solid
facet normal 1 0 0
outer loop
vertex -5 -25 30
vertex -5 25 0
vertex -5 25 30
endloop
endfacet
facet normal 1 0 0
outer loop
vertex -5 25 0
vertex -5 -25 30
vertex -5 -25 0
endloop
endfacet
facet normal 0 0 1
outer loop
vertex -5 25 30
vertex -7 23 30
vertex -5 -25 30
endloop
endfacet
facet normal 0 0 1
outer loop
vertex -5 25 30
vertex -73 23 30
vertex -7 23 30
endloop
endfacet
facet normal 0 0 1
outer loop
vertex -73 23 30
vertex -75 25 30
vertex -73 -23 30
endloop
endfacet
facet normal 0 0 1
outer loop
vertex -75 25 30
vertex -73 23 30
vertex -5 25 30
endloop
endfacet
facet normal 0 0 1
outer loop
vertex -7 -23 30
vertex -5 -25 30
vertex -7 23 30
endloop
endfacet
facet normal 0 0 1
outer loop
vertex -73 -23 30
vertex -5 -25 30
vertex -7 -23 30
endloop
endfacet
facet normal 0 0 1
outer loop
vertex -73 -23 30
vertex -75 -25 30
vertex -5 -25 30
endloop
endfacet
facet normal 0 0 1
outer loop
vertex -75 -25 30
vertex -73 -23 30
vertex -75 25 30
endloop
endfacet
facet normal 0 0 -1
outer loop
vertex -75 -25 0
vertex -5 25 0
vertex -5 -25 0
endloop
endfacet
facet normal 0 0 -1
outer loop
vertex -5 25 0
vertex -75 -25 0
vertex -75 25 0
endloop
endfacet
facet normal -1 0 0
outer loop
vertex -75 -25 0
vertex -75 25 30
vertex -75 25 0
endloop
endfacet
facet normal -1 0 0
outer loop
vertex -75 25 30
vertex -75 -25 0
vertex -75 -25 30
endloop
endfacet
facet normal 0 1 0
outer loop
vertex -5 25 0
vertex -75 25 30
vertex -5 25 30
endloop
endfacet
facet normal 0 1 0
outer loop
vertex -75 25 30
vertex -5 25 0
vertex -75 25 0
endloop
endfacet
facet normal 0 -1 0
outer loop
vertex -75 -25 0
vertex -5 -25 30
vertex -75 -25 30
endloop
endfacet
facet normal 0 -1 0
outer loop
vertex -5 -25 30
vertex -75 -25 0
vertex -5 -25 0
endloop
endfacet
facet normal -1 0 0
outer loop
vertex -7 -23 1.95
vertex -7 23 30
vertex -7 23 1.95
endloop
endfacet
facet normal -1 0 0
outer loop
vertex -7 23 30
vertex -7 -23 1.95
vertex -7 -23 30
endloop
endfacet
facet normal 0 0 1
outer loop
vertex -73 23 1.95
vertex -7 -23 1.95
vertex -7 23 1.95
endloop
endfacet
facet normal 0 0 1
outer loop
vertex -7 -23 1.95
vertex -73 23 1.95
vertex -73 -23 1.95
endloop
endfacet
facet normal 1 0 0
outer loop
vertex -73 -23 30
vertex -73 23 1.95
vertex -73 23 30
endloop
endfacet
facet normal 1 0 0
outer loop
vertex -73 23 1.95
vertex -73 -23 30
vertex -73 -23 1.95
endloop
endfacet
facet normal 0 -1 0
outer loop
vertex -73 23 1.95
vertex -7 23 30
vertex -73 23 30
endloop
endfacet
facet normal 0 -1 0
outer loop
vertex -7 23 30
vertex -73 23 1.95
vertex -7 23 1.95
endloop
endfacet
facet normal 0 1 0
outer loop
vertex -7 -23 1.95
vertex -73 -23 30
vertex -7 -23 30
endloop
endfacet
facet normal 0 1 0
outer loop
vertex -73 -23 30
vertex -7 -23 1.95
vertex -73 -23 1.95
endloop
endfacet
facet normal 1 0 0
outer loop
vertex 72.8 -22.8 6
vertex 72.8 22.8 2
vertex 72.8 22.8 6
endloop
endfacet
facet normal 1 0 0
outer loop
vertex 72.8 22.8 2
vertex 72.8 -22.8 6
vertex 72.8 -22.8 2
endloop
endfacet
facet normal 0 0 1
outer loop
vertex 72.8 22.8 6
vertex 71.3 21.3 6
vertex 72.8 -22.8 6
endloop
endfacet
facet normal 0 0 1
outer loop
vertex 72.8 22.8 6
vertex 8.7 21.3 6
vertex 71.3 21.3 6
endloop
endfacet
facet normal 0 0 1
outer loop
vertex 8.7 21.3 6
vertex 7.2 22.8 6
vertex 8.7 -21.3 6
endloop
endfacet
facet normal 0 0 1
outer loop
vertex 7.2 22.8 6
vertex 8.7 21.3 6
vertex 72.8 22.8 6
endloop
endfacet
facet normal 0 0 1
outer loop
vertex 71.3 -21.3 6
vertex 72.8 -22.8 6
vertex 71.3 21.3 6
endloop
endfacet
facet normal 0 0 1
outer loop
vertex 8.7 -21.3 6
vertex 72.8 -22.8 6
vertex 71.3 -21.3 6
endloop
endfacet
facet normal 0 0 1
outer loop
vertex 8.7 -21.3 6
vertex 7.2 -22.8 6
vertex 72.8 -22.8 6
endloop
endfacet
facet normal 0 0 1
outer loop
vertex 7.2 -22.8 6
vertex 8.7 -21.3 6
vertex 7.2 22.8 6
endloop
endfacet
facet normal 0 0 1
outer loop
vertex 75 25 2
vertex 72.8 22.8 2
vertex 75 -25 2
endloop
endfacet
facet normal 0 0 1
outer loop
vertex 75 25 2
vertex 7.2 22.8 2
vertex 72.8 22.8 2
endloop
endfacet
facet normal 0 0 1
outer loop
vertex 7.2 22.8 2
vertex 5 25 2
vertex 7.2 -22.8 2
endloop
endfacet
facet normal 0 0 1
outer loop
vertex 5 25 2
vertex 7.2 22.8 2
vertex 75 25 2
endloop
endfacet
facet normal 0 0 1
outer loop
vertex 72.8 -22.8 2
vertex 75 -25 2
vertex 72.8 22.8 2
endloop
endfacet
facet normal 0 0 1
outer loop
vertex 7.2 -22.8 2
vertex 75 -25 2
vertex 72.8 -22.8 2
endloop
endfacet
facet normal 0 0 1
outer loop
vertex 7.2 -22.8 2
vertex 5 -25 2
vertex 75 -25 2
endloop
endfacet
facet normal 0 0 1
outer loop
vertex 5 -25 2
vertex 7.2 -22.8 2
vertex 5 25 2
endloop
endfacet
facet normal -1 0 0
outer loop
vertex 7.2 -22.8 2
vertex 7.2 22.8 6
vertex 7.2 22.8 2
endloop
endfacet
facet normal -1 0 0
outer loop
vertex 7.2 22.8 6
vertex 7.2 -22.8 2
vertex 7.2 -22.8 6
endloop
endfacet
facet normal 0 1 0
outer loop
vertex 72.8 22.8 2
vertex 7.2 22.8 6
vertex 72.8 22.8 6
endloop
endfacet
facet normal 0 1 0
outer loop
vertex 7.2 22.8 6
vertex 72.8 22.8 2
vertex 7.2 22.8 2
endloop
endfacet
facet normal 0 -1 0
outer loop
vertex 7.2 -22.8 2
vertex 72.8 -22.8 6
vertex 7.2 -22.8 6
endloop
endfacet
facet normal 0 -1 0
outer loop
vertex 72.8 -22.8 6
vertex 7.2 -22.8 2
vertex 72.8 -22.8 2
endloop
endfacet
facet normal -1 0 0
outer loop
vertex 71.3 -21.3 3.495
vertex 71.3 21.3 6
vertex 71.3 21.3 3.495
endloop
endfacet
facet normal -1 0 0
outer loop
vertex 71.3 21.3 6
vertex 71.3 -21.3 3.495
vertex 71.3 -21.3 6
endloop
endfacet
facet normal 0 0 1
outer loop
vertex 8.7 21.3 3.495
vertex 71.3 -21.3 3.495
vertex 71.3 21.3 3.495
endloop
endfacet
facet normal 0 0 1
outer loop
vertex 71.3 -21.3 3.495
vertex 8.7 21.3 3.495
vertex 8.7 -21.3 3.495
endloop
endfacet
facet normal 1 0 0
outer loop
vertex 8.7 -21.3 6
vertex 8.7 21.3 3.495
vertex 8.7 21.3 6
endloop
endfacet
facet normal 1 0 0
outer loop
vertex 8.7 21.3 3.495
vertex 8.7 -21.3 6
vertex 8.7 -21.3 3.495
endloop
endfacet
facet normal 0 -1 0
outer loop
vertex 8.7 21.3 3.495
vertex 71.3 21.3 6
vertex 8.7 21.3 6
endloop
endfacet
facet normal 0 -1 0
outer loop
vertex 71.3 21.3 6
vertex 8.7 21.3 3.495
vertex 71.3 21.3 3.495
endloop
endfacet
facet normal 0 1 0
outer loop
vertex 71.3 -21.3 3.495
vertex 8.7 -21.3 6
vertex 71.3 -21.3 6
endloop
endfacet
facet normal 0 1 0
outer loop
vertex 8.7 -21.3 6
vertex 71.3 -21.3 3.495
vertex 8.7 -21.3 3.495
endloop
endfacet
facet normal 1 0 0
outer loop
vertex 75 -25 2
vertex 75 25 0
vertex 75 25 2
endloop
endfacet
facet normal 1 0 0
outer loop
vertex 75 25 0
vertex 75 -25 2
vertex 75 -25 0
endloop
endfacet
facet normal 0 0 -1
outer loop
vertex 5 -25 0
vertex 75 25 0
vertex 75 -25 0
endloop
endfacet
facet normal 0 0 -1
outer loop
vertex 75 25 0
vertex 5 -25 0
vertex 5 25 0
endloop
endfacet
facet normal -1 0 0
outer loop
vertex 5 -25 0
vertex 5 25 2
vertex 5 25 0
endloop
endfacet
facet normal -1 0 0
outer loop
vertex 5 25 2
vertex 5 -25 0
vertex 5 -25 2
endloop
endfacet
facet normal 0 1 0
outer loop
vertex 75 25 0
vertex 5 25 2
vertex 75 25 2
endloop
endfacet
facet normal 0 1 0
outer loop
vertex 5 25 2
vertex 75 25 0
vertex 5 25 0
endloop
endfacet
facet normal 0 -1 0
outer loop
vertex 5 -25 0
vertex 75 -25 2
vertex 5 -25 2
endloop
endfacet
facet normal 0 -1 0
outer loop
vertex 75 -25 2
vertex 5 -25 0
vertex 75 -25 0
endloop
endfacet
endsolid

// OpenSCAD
// Enclosure dimensions
box_x = 70;           // Box outer X dimension
box_y = 50;           // Box outer Y dimension
box_z = 30;           // Box outer Z dimension
box_wall = 2;         // Wall thickness
box_floor = 2;        // Floor thickness

lid_x = 70;           // Lid plate X dimension
lid_y = 50;           // Lid plate Y dimension
lid_thick = 2;        // Lid plate thickness
lip_outer_x = 65.6;   // Lip outer X dimension
lip_outer_y = 45.6;   // Lip outer Y dimension
lip_thick_wall = 1.5; // Lip wall thickness
lip_height = 4;       // Lip height

gap = 10;             // Gap between box and lid

// Derived dimensions
box_inner_x = box_x - 2 * box_wall;
box_inner_y = box_y - 2 * box_wall;
box_inner_z = box_z - box_floor;

lip_inner_x = lip_outer_x - 2 * lip_thick_wall;
lip_inner_y = lip_outer_y - 2 * lip_thick_wall;
lip_cavity_z = lip_height - lip_thick_wall;

// Positions (centered with 10 mm gap)
box_pos_x = -(box_x / 2 + gap / 2);
lid_pos_x = (lid_x / 2 + gap / 2);

$fn = 64;

// Part 1: Box - outer shell with open top and solid floor
translate([box_pos_x, 0, box_z / 2]) {
  difference() {
    // Outer shell
    cube([box_x, box_y, box_z], center = true);
    // Inner cavity (leave floor and walls)
    translate([0, 0, box_floor / 2]) {
      cube([box_inner_x, box_inner_y, box_inner_z + 0.1], center = true);
    }
  }
}

// Part 2: Lid - base plate
translate([lid_pos_x, 0, lid_thick / 2]) {
  cube([lid_x, lid_y, lid_thick], center = true);
}

// Part 2: Lid - lip walls (hollow on inside)
translate([lid_pos_x, 0, lid_thick + lip_height / 2]) {
  difference() {
    // Outer shell
    cube([lip_outer_x, lip_outer_y, lip_height], center = true);
    // Inner cavity with 1.5mm bottom
    translate([0, 0, lip_thick_wall / 2]) {
      cube([lip_inner_x, lip_inner_y, lip_cavity_z + 0.01], center = true);
    }
  }
}
